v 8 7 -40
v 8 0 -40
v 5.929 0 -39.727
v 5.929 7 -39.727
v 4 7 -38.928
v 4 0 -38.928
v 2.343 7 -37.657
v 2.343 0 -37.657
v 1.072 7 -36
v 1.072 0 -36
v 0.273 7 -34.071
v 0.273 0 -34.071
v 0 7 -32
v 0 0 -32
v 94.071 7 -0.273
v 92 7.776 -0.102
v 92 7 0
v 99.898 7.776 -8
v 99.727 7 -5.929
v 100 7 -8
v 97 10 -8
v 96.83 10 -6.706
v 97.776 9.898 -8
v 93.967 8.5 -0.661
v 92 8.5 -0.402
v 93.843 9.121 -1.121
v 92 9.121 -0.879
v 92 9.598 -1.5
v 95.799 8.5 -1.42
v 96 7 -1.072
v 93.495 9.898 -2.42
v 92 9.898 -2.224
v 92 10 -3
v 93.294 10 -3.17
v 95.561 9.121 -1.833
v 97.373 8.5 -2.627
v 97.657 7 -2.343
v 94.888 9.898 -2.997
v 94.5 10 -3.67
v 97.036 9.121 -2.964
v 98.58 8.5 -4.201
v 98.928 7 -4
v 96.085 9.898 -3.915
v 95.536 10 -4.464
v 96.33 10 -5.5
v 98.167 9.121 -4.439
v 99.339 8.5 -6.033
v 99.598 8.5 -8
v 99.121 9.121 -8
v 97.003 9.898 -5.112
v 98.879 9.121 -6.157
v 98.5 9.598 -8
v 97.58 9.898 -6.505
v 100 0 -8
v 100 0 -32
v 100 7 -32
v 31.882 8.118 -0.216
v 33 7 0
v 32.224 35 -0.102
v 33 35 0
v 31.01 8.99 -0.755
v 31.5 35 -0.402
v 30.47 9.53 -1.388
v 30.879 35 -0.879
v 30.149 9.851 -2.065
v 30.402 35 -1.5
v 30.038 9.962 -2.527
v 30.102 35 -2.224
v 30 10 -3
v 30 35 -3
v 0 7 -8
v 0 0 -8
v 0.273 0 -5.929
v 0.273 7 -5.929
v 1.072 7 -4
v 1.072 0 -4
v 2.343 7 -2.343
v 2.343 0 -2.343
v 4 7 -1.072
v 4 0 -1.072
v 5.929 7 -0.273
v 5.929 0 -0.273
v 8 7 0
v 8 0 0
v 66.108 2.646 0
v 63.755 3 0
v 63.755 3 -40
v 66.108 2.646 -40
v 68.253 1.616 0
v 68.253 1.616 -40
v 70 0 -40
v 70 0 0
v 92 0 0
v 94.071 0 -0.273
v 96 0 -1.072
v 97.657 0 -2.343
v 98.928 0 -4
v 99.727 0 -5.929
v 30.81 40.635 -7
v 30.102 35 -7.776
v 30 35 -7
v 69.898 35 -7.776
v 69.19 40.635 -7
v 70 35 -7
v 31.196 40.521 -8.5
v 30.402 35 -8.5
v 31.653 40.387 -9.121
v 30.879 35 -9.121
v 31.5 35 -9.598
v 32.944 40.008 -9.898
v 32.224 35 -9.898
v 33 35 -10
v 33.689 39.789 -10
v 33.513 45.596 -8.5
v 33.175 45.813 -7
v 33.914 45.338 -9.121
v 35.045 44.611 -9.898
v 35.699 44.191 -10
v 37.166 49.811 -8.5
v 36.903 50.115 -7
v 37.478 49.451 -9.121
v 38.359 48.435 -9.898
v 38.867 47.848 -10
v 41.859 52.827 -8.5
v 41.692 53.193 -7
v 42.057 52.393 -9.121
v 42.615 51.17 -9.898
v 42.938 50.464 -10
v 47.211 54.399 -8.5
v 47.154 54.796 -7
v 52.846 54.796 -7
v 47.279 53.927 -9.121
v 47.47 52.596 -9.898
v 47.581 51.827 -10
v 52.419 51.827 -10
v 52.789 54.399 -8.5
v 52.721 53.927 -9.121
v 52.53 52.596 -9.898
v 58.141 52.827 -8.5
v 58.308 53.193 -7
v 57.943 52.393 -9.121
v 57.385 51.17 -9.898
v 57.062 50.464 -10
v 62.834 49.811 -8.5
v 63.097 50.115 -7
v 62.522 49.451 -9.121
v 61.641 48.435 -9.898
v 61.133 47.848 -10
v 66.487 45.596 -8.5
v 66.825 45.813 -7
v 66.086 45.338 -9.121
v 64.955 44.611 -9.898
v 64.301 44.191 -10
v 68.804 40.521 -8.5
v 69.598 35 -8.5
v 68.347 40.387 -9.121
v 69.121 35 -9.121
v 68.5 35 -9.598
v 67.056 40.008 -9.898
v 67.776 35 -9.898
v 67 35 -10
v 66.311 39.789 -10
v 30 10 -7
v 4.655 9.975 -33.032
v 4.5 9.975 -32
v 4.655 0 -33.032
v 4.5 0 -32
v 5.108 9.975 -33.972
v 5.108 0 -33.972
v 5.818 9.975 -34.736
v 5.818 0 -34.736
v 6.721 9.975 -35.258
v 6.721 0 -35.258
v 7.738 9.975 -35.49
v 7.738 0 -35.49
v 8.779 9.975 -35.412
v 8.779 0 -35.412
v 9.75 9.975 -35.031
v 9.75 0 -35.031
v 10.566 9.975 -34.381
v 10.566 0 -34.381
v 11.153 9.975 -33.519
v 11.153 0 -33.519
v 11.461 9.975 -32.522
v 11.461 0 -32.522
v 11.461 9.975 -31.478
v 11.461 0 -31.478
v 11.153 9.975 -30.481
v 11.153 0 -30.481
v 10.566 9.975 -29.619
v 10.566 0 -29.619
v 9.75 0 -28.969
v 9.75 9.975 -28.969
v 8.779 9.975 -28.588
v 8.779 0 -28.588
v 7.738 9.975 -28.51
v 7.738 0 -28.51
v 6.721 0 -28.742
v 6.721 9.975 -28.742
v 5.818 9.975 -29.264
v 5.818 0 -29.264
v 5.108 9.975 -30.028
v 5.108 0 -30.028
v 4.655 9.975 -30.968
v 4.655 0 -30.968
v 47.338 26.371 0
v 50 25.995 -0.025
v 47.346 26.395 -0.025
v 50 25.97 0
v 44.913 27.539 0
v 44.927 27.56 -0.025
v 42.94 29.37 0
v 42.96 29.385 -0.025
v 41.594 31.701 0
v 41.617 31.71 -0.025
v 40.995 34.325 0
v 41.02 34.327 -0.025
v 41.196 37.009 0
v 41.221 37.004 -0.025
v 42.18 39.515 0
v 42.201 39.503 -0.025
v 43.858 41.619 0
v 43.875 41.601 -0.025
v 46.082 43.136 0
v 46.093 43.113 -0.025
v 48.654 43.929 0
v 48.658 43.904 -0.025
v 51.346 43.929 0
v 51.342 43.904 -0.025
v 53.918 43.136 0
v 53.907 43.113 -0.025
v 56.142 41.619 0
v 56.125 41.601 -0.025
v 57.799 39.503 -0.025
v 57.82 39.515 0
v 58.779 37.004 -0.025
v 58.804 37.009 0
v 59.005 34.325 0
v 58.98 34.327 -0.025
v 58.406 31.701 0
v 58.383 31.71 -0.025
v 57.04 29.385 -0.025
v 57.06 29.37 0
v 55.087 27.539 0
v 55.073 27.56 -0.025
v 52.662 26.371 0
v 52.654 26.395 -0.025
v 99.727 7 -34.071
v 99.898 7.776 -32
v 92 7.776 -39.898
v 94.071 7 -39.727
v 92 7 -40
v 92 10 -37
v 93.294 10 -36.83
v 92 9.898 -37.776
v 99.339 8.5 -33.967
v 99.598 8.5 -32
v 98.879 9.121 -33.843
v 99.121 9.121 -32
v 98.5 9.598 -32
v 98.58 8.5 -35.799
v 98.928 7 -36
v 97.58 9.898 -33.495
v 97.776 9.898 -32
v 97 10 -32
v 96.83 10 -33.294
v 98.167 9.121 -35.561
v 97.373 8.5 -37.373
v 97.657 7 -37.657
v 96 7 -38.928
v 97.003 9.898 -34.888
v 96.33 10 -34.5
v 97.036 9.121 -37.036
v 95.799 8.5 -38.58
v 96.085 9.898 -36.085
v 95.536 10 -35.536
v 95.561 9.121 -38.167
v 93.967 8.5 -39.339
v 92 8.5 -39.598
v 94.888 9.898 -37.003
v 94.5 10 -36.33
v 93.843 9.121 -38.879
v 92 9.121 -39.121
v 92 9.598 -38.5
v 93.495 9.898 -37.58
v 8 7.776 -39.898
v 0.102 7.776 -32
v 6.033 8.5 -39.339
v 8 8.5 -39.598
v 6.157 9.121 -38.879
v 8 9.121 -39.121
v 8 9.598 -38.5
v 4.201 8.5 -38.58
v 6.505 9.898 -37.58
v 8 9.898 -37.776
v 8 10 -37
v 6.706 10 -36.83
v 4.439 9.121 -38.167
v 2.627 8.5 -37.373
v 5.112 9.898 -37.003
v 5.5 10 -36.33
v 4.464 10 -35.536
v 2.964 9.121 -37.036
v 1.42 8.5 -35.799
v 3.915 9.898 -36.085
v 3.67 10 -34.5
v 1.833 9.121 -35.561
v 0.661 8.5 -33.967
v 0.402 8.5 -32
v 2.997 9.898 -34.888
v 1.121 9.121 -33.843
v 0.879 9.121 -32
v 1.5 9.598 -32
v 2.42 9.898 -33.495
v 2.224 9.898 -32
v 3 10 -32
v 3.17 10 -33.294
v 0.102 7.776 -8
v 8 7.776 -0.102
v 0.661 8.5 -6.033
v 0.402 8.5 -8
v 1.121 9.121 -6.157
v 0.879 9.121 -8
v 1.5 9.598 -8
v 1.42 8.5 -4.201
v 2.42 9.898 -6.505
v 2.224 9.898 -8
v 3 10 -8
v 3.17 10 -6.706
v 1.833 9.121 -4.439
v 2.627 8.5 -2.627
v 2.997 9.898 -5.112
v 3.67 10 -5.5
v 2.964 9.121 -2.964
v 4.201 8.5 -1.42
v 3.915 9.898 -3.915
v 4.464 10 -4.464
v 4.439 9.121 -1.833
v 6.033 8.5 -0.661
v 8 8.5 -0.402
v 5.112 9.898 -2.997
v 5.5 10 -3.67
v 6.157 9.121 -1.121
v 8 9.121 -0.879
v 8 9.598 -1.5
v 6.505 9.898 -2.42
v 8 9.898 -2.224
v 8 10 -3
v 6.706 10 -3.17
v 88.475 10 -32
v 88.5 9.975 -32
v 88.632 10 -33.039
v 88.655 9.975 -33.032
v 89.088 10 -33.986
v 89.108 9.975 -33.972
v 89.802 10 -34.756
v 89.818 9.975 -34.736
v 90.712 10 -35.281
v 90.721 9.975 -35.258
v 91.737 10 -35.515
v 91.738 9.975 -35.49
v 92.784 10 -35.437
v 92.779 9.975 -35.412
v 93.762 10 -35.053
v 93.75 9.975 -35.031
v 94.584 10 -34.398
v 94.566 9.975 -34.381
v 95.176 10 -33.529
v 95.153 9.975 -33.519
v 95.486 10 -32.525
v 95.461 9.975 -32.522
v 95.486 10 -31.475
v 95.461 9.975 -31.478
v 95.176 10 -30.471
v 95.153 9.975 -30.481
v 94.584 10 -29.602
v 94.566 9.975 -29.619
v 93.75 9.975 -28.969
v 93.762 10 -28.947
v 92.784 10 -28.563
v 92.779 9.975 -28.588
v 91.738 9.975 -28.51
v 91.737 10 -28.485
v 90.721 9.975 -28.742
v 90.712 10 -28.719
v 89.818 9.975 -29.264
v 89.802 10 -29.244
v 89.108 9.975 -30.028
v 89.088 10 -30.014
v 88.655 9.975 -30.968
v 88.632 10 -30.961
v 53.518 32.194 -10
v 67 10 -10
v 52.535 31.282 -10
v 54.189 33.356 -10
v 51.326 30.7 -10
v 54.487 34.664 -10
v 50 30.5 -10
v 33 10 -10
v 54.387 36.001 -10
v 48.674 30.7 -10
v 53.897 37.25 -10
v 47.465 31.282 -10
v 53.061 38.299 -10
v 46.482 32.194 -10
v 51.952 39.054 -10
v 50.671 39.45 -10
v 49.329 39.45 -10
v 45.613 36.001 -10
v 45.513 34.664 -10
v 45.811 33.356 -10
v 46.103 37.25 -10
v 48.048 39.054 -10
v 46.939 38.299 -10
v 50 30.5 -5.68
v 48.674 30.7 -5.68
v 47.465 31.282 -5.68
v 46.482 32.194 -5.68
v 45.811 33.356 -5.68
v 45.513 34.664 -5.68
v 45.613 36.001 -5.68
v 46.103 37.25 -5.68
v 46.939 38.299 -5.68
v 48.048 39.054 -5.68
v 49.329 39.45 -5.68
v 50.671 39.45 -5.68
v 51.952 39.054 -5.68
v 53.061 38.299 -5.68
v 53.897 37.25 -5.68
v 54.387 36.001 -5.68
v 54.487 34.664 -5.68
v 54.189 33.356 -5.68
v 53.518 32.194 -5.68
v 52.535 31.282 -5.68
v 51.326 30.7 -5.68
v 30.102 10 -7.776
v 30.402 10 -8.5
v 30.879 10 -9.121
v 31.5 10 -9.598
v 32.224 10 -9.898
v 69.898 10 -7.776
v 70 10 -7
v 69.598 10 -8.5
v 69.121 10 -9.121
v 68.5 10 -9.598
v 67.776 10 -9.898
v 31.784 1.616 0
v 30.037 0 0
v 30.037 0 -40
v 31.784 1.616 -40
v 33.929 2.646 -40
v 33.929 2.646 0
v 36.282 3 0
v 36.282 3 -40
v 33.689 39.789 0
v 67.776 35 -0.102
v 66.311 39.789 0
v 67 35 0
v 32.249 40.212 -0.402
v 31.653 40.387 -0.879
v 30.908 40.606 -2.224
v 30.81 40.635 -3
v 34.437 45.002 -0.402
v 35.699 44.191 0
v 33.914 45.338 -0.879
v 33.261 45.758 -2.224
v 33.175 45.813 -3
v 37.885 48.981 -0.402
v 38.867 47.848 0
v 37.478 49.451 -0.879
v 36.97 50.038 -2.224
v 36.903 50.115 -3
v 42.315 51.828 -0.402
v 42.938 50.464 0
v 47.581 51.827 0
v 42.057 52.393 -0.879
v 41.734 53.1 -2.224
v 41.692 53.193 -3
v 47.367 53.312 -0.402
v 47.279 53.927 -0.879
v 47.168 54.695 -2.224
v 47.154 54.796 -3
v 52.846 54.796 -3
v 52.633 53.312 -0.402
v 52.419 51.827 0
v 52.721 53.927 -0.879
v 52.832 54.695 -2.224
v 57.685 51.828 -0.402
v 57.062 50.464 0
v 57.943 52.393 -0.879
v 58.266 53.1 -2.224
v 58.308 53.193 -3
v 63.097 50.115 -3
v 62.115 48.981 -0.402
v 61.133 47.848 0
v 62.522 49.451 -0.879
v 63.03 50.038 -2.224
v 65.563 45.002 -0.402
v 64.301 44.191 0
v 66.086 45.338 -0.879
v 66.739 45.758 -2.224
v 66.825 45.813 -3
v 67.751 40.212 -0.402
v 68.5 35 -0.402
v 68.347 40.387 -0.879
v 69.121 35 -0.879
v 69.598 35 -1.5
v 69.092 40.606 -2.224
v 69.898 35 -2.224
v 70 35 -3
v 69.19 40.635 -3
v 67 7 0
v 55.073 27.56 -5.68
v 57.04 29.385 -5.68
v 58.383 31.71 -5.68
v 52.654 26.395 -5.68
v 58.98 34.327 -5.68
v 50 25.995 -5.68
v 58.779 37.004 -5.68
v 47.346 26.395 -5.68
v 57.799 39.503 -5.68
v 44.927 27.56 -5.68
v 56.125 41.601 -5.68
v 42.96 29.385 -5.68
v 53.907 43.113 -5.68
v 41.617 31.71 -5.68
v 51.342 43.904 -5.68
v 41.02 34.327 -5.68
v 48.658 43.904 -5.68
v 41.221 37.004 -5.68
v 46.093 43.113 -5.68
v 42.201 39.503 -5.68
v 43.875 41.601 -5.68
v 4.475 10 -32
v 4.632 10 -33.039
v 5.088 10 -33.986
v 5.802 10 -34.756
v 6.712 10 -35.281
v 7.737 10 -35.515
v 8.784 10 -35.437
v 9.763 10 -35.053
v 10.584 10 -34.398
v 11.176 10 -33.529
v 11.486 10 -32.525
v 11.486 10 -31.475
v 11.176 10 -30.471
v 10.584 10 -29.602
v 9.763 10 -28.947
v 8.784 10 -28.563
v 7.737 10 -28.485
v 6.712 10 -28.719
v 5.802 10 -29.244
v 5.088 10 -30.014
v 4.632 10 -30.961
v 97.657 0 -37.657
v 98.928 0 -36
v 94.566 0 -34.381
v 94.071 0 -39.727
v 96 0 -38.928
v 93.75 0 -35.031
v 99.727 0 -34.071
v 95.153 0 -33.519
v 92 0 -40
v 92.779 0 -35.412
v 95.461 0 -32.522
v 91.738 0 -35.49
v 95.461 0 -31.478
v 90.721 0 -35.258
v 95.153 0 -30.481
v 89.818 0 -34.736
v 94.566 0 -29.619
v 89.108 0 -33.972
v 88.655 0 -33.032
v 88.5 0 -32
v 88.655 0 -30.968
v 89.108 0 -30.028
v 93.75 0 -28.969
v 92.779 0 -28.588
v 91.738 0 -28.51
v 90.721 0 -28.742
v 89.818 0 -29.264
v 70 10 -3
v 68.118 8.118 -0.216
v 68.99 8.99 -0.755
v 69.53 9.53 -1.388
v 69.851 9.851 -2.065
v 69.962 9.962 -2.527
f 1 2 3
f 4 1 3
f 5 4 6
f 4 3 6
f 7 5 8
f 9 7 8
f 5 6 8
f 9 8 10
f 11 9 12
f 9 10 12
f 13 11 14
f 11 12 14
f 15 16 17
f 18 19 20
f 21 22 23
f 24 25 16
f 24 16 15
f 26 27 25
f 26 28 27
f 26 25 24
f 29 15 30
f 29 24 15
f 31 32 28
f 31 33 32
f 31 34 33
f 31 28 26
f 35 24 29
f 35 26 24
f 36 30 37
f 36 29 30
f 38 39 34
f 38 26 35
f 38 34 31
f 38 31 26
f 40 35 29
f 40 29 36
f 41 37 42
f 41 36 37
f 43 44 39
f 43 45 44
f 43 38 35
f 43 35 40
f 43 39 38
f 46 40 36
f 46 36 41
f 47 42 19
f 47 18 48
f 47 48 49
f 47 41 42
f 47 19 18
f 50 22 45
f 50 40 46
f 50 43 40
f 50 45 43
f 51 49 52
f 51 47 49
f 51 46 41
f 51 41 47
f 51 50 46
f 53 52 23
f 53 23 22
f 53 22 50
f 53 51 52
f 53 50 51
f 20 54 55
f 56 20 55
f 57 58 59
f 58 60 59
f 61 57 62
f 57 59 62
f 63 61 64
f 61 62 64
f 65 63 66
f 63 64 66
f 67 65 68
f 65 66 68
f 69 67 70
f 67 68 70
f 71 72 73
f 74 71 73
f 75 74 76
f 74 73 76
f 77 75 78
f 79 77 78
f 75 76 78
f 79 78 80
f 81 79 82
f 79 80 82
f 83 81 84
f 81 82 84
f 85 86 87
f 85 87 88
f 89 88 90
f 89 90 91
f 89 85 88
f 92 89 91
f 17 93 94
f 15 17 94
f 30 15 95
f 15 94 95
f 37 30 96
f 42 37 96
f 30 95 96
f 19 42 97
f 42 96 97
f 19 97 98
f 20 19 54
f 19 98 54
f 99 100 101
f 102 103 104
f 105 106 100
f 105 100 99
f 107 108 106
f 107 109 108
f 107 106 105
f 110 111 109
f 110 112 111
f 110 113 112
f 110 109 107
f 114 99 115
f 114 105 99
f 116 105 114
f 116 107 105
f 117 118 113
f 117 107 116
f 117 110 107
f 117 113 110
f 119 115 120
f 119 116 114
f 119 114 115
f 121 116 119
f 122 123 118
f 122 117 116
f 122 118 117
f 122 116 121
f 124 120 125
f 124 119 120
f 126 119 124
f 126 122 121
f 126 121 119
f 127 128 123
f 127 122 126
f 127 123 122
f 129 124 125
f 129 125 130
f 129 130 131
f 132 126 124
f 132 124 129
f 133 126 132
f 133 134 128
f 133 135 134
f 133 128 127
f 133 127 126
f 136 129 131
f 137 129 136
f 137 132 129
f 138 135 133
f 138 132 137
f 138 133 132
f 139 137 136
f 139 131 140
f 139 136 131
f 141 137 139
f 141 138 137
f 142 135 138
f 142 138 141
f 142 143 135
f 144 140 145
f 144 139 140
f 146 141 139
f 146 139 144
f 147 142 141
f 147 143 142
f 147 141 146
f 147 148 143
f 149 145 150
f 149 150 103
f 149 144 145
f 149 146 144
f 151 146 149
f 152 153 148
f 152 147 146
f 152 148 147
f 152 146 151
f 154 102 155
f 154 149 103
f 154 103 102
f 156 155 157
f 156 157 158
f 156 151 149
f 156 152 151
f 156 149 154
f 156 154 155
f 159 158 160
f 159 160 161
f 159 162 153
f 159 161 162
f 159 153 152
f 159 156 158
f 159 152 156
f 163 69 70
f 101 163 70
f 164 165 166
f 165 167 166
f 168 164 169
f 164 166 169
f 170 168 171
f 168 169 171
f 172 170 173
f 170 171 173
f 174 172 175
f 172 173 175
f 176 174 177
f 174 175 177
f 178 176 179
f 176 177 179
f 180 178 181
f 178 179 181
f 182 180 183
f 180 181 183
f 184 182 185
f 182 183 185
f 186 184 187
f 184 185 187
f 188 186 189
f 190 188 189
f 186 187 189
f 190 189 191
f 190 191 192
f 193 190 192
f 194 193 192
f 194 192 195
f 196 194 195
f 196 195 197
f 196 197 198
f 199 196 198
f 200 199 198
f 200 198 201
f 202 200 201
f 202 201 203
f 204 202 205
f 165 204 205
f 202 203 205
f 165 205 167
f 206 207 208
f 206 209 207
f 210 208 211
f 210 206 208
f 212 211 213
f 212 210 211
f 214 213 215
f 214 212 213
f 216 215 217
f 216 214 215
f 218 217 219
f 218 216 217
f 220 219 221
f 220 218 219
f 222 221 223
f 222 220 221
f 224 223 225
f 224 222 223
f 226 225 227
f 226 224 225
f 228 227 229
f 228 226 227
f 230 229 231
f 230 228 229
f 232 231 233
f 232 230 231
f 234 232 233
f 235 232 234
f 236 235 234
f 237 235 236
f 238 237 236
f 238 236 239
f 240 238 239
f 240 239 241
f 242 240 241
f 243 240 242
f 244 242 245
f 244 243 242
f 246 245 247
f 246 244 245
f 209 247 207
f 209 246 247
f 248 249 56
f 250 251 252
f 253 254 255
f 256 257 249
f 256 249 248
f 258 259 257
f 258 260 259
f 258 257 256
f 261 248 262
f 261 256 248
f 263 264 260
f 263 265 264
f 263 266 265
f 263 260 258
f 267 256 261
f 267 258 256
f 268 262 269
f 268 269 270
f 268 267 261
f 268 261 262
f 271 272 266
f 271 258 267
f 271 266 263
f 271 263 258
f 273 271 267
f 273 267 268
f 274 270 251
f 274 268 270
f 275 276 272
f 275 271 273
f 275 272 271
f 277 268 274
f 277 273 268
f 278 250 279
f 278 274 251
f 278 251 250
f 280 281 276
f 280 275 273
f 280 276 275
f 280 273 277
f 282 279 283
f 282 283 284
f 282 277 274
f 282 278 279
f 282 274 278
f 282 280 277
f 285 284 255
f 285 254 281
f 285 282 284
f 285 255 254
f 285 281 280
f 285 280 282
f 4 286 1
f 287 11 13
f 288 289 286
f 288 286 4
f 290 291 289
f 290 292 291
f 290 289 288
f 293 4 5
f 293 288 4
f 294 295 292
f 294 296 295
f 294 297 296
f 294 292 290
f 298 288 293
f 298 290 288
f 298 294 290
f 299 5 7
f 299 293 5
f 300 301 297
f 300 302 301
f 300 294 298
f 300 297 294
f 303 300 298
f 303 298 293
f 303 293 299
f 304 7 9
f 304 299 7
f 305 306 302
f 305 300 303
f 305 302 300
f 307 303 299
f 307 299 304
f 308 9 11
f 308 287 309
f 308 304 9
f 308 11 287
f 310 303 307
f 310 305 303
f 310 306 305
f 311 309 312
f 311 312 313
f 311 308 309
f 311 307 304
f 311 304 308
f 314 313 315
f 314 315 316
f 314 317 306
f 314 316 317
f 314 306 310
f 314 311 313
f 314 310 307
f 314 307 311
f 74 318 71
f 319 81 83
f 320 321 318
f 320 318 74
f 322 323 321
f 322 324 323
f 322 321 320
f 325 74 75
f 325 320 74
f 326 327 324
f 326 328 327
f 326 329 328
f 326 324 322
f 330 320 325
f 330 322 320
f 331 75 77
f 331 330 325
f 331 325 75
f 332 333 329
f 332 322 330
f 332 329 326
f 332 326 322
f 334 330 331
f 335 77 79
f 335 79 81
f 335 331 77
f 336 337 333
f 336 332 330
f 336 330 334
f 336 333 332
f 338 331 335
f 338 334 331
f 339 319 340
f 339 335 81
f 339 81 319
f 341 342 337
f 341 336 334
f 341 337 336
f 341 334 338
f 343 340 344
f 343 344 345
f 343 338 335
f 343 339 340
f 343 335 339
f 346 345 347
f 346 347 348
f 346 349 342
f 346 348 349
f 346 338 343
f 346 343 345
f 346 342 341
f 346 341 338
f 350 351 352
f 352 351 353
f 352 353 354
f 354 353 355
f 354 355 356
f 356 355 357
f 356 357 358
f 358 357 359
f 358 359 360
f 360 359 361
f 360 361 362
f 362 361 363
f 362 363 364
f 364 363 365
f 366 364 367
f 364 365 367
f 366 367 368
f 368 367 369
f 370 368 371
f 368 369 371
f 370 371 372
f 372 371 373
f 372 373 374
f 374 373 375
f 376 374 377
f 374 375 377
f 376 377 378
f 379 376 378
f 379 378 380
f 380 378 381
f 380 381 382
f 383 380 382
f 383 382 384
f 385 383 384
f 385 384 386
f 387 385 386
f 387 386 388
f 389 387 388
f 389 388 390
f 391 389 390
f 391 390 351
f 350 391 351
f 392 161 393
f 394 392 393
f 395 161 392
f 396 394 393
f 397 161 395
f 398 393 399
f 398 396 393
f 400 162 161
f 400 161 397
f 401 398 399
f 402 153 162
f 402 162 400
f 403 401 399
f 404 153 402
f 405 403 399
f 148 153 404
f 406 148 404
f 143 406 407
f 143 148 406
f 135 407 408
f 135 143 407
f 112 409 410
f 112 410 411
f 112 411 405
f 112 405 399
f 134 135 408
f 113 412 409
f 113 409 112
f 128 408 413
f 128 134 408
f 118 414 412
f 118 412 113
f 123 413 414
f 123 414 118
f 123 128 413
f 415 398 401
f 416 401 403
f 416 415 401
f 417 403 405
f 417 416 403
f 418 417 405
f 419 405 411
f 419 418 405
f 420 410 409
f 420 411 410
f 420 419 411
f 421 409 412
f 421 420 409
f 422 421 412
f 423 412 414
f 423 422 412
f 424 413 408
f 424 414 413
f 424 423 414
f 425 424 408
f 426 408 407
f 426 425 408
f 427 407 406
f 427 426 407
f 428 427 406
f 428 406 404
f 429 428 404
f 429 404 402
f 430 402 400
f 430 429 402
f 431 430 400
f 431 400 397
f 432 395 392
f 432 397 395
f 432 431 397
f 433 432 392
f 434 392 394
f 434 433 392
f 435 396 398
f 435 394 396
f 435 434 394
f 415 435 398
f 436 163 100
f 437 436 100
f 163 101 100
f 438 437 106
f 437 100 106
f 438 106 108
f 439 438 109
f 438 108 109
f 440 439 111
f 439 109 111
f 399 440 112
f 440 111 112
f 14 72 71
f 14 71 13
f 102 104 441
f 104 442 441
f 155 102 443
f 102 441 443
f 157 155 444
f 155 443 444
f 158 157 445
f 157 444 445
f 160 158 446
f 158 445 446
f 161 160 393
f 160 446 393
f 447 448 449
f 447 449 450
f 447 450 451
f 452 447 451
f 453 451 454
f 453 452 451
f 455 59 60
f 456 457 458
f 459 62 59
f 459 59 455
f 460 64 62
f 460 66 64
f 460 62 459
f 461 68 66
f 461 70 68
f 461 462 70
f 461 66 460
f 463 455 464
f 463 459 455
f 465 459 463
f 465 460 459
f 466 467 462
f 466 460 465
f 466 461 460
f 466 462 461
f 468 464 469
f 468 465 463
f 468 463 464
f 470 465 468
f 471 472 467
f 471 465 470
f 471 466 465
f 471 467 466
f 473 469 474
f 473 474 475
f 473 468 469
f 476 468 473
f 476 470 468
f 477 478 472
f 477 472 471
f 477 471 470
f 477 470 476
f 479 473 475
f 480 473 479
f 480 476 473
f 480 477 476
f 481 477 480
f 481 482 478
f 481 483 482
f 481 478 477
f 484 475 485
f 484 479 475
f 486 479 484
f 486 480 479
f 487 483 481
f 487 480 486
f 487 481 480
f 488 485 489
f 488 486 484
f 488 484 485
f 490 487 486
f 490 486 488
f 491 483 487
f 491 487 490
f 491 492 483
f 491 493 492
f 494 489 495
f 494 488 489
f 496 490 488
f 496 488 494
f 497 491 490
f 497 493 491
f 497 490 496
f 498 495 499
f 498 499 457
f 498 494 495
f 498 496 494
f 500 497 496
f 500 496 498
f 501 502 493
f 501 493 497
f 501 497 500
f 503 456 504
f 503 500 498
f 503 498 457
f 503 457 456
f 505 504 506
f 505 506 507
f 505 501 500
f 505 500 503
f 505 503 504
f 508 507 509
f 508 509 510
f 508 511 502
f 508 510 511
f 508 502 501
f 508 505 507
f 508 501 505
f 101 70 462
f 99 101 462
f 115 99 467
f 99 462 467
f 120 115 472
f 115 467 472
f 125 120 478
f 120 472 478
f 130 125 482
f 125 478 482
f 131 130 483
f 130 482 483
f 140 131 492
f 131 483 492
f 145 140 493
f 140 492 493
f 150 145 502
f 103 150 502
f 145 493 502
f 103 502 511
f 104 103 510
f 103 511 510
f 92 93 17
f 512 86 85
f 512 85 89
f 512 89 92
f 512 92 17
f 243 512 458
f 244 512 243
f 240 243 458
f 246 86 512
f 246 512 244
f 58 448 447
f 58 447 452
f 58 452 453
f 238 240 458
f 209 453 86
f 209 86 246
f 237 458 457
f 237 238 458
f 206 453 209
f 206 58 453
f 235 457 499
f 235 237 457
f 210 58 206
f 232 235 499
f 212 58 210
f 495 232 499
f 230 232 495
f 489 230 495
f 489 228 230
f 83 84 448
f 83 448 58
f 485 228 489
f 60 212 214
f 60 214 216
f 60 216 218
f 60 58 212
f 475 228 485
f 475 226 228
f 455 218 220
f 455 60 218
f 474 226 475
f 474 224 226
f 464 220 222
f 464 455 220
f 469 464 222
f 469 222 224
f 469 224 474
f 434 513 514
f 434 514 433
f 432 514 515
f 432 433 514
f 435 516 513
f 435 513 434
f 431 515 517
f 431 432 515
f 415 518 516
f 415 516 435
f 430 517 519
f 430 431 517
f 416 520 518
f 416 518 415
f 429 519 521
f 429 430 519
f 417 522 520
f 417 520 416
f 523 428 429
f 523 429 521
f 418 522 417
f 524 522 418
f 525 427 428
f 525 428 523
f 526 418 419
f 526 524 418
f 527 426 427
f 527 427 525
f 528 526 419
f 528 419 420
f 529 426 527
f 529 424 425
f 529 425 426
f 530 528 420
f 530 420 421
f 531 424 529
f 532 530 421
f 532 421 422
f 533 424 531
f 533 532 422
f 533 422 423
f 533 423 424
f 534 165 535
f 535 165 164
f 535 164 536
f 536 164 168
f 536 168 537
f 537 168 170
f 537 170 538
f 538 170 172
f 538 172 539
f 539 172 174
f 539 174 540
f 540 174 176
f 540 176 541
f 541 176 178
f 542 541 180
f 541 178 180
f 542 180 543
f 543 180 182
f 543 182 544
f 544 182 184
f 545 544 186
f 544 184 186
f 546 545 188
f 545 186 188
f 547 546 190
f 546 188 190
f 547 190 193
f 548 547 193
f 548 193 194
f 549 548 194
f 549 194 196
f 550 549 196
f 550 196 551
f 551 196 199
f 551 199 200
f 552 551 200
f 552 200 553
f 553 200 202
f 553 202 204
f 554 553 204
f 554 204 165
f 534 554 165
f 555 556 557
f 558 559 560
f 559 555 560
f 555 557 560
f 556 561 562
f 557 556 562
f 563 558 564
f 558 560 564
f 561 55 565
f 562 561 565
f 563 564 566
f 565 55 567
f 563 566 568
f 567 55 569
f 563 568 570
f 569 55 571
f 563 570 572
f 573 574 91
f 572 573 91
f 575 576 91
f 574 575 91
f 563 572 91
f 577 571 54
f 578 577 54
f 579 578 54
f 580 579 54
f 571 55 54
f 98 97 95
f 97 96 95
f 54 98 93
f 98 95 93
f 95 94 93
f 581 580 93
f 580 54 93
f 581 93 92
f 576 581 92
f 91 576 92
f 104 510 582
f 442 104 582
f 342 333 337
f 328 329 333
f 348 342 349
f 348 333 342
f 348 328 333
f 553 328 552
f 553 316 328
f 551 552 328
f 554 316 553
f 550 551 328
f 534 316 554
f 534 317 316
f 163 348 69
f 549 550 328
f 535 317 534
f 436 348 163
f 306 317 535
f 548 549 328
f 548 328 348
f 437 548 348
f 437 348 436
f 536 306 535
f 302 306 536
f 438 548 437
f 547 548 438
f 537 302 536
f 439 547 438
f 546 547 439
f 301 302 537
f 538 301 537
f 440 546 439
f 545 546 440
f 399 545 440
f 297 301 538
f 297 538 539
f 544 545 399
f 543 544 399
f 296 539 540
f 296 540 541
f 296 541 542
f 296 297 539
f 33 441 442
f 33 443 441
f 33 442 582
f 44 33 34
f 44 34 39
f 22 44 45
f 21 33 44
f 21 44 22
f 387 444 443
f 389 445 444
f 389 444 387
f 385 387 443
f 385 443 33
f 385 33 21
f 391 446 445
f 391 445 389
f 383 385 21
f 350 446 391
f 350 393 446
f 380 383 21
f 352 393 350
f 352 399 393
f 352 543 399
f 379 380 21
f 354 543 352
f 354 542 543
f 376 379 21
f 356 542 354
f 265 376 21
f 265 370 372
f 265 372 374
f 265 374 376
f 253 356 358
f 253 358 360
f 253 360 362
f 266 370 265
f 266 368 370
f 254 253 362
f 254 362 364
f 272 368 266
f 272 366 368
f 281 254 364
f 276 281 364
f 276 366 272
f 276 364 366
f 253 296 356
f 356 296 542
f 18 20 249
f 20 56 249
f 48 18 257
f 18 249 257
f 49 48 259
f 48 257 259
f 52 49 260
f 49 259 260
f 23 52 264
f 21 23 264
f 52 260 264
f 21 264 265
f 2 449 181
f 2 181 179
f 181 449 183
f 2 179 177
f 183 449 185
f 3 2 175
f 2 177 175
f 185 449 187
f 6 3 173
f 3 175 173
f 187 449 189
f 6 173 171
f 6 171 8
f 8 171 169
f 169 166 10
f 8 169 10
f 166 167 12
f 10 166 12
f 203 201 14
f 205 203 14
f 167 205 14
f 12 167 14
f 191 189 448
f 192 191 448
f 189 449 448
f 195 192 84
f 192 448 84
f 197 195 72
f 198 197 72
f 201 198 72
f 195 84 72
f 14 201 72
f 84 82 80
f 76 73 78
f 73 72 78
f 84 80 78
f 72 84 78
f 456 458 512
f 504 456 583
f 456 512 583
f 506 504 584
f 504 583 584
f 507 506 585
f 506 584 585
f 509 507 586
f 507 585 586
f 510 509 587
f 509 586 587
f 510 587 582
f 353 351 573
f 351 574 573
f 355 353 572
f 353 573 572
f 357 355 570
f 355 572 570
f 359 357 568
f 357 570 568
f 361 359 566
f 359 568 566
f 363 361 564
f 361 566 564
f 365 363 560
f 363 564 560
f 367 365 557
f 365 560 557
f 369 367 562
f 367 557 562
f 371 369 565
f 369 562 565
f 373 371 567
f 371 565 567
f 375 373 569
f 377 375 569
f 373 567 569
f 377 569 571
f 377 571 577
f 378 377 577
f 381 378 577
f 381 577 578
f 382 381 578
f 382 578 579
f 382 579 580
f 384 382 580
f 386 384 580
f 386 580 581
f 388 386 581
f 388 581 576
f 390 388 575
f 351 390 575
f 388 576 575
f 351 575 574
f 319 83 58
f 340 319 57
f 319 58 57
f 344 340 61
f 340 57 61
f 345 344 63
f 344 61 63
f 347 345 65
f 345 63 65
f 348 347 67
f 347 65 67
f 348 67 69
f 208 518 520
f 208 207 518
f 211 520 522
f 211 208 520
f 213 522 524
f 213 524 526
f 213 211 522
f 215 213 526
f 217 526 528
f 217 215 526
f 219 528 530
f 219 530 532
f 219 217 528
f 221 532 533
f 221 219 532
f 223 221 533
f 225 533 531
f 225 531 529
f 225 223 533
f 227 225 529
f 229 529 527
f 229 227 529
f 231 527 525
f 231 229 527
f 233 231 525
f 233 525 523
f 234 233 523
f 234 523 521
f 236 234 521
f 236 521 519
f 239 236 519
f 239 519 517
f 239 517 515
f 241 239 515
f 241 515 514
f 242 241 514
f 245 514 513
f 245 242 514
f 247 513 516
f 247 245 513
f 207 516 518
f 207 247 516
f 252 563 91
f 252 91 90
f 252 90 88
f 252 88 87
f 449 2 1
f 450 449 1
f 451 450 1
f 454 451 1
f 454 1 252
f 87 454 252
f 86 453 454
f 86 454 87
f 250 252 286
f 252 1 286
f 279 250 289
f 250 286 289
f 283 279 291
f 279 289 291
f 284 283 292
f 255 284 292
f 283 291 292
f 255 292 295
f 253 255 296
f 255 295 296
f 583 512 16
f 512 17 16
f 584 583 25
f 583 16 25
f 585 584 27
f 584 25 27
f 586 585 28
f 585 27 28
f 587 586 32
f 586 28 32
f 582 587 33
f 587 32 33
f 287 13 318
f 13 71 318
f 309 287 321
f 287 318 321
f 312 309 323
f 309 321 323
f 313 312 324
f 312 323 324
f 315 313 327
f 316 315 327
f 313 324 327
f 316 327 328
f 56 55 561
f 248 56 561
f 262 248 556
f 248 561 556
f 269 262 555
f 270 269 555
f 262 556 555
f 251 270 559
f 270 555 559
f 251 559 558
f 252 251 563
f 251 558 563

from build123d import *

# Parameters (mm, degrees)
ESBO_O1_W                            = 100
ESBO_O1_H                            = 40
RESSALTO_EXTRUS_O1_DEPTH             = 10
RESSALTO_EXTRUS_O2_DEPTH             = 10
ESBO_O3_W                            = 39.962527671
ESBO_O3_H                            = 3
CORTE_EXTRUS_O1_DEPTH                = 121.933866224
FILETE1_R                            = 8
FURO_DE_DI_METRO_7_0_7_1_D           = 7
FURO_DE_DI_METRO_7_0_7_1_CSINK_D     = 7.05
FURO_DE_DI_METRO_7_0_7_1_CSINK_ANGLE = 90
FURO_DE_DI_METRO_7_0_7_3_D           = 7
FURO_DE_DI_METRO_7_0_7_3_CSINK_D     = 7.05
FURO_DE_DI_METRO_7_0_7_3_CSINK_ANGLE = 90
FILETE3_R                            = 3


with BuildPart() as part:
    # Esboço1 → Ressalto-extrusão1 (new body)
    with BuildSketch(Plane(origin=(0, 0, 0), x_dir=(1, 0, 0), z_dir=(0, 1, 0))):
        with Locations((50, 20)):
            Rectangle(ESBO_O1_W, ESBO_O1_H)
    extrude(amount=RESSALTO_EXTRUS_O1_DEPTH)

    # Esboço2 → Ressalto-extrusão2 (add)
    with BuildSketch(Plane.XY):
        with BuildLine():
            Line((30, 0), (30, 35))
            ThreePointArc((30, 35), (50, 55), (70, 35))
            Line((70, 35), (70, 0))
            Line((70, 0), (30, 0))
        make_face()
    extrude(amount=-RESSALTO_EXTRUS_O2_DEPTH)

    # Esboço3 → Corte-extrusão1 (cut, through all)
    with BuildSketch(Plane.XY):
        with Locations((50.018736164, 1.5)):
            Rectangle(ESBO_O3_W, ESBO_O3_H)
    extrude(amount=-CORTE_EXTRUS_O1_DEPTH, mode=Mode.SUBTRACT)

    # Filete1
    # the kernel refuses this fillet: 8 mm, written as the material it adds along each edge
    with BuildSketch(Plane(origin=(70, 3, 0), x_dir=(-1, 0, 0), z_dir=(0, 0, -1))) as filete1_piece_1:
        with BuildLine():
            CenterArc((6.244997998, -8), FILETE1_R, 90, 51.317812547)
            Line((0, -3), (0, 0))
            Line((0, 0), (6.244997998, 0))
        make_face()
    extrude(amount=40)
    with BuildSketch(Plane(origin=(30.037472329, 3, 0), x_dir=(0, -1, 0), z_dir=(0, 0, -1))) as filete1_piece_2:
        with BuildLine():
            CenterArc((8, -6.244997998), FILETE1_R, 128.682187453, 51.317812547)
            Line((0, -6.244997998), (0, 0))
            Line((0, 0), (3, 0))
        make_face()
    extrude(amount=40)
    # the kernel refuses this fillet: 8 mm, written as the material it takes off along each edge
    with BuildSketch(Plane(origin=(100, -20, 0), x_dir=(-1, 0, 0), z_dir=(0, 1, 0)), Plane(origin=(100, -20, -40), x_dir=(0, 0, 1), z_dir=(0, 1, 0))) as filete1_2_piece_1:
        with BuildLine():
            CenterArc((FILETE1_R, -FILETE1_R), FILETE1_R, 90, 90)
            Line((0, -FILETE1_R), (0, 0))
            Line((0, 0), (FILETE1_R, 0))
        make_face()
    extrude(amount=50, mode=Mode.SUBTRACT)
    with BuildSketch(Plane(origin=(0, -20, -40), x_dir=(0, 0, 1), z_dir=(0, 1, 0)), Plane(origin=(0, -20, 0), x_dir=(1, 0, 0), z_dir=(0, 1, 0))) as filete1_2_piece_2:
        with BuildLine():
            CenterArc((FILETE1_R, FILETE1_R), FILETE1_R, 180, 90)
            Line((0, FILETE1_R), (0, 0))
            Line((0, 0), (FILETE1_R, 0))
        make_face()
    extrude(amount=50, mode=Mode.SUBTRACT)

    # Furo de diâmetro Ø7.0 (7)1 (through all)
    with Locations(Plane(origin=(0, 10, 0), x_dir=(1, 0, 0), z_dir=(0, 1, 0))):
        with Locations((8, 32)):
            CounterSinkHole(FURO_DE_DI_METRO_7_0_7_1_D / 2, FURO_DE_DI_METRO_7_0_7_1_CSINK_D / 2, counter_sink_angle=FURO_DE_DI_METRO_7_0_7_1_CSINK_ANGLE)

    # Furo de diâmetro Ø7.0 (7)3 (through all)
    with Locations(Plane(origin=(0, 10, 0), x_dir=(1, 0, 0), z_dir=(0, 1, 0))):
        with Locations((92, 32)):
            CounterSinkHole(FURO_DE_DI_METRO_7_0_7_3_D / 2, FURO_DE_DI_METRO_7_0_7_3_CSINK_D / 2, counter_sink_angle=FURO_DE_DI_METRO_7_0_7_3_CSINK_ANGLE)

    # Esboço16 → Rebaixo para parafuso de cabeça sextavada de M81 (revolve, cut)
    with BuildSketch(Plane(origin=(50, 35, 0), x_dir=(0, -1, 0), z_dir=(1, 0, 0))):
        Polygon((0, 0), (0, 40), (4.5, 40), (4.5, 5.68), (9.005, 5.68), (9.005, 0.025), (9.03, 0), align=None)
    revolve(axis=Axis((50, 35, 6.35), (0, 0, -1)), mode=Mode.SUBTRACT)

    # Filete3
    filete3_edges = [part.edges().sort_by_distance(p)[0] for p in [
        (81, 10, 0),
        (30, 22.5, -10),
        (70, 22.5, -10),
        (30, 22.5, 0),
        (70, 22.5, 0),
        (50, 55, 0),
        (50, 55, -10),
        (100, 10, -20),
        (19, 10, 0),
        (50, 10, -40),
        (0, 10, -20),
        (2.343145751, 10, -2.343145751),
        (2.343145751, 10, -37.656854249),
        (97.656854249, 10, -37.656854249),
        (97.656854249, 10, -2.343145751),
    ]]
    fillet(filete3_edges, radius=FILETE3_R)


solid = part.part
